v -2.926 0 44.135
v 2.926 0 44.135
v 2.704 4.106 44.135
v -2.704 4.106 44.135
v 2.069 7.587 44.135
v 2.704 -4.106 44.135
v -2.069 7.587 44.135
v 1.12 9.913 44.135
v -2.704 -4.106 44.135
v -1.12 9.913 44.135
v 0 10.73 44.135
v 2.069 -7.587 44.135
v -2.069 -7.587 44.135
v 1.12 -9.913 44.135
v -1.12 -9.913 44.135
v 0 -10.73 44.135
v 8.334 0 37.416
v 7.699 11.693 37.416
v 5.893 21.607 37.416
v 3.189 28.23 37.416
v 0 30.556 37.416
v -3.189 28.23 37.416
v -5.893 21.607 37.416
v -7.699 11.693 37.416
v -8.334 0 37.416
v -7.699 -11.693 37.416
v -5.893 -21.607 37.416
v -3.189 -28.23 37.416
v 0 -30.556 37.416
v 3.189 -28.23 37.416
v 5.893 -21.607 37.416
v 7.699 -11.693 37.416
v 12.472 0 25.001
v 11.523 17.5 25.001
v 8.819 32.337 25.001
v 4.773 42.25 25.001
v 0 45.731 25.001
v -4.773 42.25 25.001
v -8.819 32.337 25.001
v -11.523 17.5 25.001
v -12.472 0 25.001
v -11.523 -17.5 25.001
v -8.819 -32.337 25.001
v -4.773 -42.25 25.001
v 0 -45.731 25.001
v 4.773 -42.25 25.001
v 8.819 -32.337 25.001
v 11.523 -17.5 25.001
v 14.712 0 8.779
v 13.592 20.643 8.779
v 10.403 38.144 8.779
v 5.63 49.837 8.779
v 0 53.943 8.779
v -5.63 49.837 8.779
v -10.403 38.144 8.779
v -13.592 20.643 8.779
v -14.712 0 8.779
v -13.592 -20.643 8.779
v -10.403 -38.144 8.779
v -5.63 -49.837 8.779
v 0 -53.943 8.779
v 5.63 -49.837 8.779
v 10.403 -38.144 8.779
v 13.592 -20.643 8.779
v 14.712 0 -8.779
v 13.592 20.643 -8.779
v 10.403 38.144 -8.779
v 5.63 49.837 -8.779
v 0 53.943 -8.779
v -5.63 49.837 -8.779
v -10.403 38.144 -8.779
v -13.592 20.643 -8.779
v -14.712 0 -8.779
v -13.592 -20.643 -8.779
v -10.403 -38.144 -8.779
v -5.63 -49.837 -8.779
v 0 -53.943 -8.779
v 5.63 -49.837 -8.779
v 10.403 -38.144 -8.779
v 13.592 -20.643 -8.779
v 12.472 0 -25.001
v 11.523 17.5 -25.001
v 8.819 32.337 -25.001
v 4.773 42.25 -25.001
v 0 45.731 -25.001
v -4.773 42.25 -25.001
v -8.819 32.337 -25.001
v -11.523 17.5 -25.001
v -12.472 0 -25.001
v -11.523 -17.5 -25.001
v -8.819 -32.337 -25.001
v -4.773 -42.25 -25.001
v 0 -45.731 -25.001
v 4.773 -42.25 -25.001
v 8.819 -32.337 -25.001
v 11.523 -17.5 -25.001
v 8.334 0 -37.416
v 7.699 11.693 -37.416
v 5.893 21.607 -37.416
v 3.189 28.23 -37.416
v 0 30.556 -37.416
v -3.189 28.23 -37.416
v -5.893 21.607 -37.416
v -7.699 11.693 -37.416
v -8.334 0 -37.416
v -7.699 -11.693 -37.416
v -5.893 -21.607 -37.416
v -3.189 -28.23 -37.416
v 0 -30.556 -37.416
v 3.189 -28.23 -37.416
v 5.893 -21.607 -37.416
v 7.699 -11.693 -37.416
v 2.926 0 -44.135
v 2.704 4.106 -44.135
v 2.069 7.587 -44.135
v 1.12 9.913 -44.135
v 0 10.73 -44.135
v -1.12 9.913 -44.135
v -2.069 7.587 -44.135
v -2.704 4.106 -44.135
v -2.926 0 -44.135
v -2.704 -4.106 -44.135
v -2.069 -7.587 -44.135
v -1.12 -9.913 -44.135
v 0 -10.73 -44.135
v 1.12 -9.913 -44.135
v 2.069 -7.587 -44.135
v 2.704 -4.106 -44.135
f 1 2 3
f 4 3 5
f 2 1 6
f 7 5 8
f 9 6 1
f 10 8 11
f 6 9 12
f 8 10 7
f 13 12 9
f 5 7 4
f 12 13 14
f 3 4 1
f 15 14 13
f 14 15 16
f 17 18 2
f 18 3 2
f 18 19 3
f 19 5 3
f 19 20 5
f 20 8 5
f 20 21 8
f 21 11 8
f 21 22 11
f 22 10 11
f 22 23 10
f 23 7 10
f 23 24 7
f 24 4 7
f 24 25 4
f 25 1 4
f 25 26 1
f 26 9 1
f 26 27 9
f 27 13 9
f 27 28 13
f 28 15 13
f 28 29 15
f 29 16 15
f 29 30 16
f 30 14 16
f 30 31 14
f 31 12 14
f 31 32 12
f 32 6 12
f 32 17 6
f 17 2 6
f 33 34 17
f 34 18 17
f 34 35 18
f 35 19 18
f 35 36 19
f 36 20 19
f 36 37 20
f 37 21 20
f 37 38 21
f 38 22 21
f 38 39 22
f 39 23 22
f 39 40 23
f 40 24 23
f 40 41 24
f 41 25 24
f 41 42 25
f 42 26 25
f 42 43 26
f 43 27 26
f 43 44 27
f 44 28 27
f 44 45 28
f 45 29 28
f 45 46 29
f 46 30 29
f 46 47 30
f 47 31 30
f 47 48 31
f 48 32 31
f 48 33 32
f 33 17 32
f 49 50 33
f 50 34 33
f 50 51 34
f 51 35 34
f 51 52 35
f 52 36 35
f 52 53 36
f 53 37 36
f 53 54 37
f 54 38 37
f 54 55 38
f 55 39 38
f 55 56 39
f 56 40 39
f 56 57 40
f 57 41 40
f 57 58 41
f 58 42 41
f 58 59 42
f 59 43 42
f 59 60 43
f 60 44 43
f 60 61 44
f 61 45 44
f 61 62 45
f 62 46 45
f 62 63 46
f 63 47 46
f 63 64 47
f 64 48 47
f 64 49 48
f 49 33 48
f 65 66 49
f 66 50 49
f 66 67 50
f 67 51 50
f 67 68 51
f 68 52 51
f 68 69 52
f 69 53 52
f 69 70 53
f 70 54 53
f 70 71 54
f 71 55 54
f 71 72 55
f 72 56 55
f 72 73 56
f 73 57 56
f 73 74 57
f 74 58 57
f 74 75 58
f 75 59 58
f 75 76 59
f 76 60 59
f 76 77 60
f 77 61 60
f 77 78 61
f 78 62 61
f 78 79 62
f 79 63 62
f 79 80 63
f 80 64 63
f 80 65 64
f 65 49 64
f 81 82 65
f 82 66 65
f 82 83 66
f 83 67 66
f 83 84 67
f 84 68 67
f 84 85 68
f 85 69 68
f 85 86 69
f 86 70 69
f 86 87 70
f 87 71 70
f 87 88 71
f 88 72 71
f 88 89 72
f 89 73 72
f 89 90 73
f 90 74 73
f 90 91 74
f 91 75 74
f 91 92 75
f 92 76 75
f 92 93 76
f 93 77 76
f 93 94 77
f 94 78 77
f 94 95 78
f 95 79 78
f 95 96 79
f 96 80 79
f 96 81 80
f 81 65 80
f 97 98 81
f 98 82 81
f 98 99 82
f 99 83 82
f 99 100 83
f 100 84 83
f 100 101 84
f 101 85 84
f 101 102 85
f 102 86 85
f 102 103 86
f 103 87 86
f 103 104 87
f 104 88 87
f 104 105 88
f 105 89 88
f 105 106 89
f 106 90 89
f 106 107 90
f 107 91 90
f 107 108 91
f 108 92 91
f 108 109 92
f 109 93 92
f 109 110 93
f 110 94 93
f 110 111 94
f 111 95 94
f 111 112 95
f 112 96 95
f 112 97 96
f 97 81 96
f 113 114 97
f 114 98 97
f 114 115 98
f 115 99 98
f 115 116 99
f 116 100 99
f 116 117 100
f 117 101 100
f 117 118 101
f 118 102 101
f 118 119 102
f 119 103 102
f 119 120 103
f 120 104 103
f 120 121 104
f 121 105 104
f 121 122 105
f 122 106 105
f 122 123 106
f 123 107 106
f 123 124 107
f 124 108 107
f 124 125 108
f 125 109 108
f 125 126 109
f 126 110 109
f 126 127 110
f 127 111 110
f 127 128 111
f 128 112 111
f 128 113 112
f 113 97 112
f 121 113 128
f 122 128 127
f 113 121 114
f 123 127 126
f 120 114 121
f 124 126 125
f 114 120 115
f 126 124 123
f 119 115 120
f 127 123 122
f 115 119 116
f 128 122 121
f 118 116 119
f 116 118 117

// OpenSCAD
// Generated by SolidPython 1.0.1 on 2020-07-29 00:46:45


scale(v = [3, 11, 9]) {
	sphere(r = 5);
}
/***********************************************
*********      SolidPython code:      **********
************************************************
 
# import packages: SolidPython
from solid import *
from solid.utils import *
from itertools import chain, combinations, permutations


class Resize:

    def __init__(self, scad_file):
        self.scad_file = scad_file
        #self.scad_file = import_scad(scad_file)
        # cone/cylinder param:
        self.r1 = 0
        self.r2 = 0
        self.h = 0
        # rectangular prism param:
        self.w = 0
        self.l = 0
        # ellipse param:
        self.r = 0

    # import OpenScad code (file name corresponds to shape)


    # classify shape + parameters
    def assign(self, param1, param2, param3):
        if self.scad_file == 'cone.scad':
            self.r1 = param1
            self.r2 = param2
            self.h = param3
        elif self.scad_file == 'cylinder.scad':
            self.r1 = param1
            self.r2 = param2
            self.h = param3
        elif self.scad_file == 'rectangularPrism.scad':
            self.h = param1
            self.l = param2
            self.w = param3
        else:
            self.r = param1
            self.h = param2

    # resize parameters
    def iterate(self):
        x = range(3, 20, 2)
        i = 1
        if self.scad_file == 'cone.scad':
            tempList = list(permutations(x, 2))
            for temp in tempList:
                param1 = temp[0]
                param2 = temp[1]
                filepath = 'produced_scad_files/' + 'cone' + str(param1) + '_' + str(param2) + '_' + '.scad'
                scad_render_to_file(cylinder(h=param1, r1=param2, r2=0), filepath)

        elif self.scad_file == 'cylinder.scad':
            tempList = list(permutations(x, 3))
            for temp in tempList:
                param1 = temp[0]
                param2 = temp[1]
                filepath = 'produced_scad_files/' + 'cylinder' + str(param1) + '_' + str(param2) + '_' + '.scad'
                scad_render_to_file(cylinder(h=param1, r1=param2, r2=param2), filepath)

        elif self.scad_file == 'rectangularPrism.scad':
            tempList = list(permutations(x, 3))
            for temp in tempList:
                param1 = temp[0]
                param2 = temp[1]
                param3 = temp[2]
                filepath = 'produced_scad_files/' + 'rectangularPrism' + str(param1) + '_' + str(param2) + '_' + str(
                    param3) + '.scad'
                scad_render_to_file(cube(size=(param1, param2, param3)), filepath)

        elif self.scad_file == 'ellipse.scad':
            tempList = list(permutations(x, 4))
            for temp in tempList:
                param1 = temp[0]
                param2 = temp[1]
                param3 = temp[2]
                param4 = temp[3]
                filepath = 'produced_scad_files/' + 'ellipse' + str(param1) + '_' + str(param2) + '_' + str(param3) + '_' + str(param4) + '.scad'
                scad_render_to_file(scale([param1, param2, param3])(sphere(r=param4)), filepath)

    def render_to_scadfile(self):
        scad_render_to_file(scad, 'example.scad') 
 
************************************************/
